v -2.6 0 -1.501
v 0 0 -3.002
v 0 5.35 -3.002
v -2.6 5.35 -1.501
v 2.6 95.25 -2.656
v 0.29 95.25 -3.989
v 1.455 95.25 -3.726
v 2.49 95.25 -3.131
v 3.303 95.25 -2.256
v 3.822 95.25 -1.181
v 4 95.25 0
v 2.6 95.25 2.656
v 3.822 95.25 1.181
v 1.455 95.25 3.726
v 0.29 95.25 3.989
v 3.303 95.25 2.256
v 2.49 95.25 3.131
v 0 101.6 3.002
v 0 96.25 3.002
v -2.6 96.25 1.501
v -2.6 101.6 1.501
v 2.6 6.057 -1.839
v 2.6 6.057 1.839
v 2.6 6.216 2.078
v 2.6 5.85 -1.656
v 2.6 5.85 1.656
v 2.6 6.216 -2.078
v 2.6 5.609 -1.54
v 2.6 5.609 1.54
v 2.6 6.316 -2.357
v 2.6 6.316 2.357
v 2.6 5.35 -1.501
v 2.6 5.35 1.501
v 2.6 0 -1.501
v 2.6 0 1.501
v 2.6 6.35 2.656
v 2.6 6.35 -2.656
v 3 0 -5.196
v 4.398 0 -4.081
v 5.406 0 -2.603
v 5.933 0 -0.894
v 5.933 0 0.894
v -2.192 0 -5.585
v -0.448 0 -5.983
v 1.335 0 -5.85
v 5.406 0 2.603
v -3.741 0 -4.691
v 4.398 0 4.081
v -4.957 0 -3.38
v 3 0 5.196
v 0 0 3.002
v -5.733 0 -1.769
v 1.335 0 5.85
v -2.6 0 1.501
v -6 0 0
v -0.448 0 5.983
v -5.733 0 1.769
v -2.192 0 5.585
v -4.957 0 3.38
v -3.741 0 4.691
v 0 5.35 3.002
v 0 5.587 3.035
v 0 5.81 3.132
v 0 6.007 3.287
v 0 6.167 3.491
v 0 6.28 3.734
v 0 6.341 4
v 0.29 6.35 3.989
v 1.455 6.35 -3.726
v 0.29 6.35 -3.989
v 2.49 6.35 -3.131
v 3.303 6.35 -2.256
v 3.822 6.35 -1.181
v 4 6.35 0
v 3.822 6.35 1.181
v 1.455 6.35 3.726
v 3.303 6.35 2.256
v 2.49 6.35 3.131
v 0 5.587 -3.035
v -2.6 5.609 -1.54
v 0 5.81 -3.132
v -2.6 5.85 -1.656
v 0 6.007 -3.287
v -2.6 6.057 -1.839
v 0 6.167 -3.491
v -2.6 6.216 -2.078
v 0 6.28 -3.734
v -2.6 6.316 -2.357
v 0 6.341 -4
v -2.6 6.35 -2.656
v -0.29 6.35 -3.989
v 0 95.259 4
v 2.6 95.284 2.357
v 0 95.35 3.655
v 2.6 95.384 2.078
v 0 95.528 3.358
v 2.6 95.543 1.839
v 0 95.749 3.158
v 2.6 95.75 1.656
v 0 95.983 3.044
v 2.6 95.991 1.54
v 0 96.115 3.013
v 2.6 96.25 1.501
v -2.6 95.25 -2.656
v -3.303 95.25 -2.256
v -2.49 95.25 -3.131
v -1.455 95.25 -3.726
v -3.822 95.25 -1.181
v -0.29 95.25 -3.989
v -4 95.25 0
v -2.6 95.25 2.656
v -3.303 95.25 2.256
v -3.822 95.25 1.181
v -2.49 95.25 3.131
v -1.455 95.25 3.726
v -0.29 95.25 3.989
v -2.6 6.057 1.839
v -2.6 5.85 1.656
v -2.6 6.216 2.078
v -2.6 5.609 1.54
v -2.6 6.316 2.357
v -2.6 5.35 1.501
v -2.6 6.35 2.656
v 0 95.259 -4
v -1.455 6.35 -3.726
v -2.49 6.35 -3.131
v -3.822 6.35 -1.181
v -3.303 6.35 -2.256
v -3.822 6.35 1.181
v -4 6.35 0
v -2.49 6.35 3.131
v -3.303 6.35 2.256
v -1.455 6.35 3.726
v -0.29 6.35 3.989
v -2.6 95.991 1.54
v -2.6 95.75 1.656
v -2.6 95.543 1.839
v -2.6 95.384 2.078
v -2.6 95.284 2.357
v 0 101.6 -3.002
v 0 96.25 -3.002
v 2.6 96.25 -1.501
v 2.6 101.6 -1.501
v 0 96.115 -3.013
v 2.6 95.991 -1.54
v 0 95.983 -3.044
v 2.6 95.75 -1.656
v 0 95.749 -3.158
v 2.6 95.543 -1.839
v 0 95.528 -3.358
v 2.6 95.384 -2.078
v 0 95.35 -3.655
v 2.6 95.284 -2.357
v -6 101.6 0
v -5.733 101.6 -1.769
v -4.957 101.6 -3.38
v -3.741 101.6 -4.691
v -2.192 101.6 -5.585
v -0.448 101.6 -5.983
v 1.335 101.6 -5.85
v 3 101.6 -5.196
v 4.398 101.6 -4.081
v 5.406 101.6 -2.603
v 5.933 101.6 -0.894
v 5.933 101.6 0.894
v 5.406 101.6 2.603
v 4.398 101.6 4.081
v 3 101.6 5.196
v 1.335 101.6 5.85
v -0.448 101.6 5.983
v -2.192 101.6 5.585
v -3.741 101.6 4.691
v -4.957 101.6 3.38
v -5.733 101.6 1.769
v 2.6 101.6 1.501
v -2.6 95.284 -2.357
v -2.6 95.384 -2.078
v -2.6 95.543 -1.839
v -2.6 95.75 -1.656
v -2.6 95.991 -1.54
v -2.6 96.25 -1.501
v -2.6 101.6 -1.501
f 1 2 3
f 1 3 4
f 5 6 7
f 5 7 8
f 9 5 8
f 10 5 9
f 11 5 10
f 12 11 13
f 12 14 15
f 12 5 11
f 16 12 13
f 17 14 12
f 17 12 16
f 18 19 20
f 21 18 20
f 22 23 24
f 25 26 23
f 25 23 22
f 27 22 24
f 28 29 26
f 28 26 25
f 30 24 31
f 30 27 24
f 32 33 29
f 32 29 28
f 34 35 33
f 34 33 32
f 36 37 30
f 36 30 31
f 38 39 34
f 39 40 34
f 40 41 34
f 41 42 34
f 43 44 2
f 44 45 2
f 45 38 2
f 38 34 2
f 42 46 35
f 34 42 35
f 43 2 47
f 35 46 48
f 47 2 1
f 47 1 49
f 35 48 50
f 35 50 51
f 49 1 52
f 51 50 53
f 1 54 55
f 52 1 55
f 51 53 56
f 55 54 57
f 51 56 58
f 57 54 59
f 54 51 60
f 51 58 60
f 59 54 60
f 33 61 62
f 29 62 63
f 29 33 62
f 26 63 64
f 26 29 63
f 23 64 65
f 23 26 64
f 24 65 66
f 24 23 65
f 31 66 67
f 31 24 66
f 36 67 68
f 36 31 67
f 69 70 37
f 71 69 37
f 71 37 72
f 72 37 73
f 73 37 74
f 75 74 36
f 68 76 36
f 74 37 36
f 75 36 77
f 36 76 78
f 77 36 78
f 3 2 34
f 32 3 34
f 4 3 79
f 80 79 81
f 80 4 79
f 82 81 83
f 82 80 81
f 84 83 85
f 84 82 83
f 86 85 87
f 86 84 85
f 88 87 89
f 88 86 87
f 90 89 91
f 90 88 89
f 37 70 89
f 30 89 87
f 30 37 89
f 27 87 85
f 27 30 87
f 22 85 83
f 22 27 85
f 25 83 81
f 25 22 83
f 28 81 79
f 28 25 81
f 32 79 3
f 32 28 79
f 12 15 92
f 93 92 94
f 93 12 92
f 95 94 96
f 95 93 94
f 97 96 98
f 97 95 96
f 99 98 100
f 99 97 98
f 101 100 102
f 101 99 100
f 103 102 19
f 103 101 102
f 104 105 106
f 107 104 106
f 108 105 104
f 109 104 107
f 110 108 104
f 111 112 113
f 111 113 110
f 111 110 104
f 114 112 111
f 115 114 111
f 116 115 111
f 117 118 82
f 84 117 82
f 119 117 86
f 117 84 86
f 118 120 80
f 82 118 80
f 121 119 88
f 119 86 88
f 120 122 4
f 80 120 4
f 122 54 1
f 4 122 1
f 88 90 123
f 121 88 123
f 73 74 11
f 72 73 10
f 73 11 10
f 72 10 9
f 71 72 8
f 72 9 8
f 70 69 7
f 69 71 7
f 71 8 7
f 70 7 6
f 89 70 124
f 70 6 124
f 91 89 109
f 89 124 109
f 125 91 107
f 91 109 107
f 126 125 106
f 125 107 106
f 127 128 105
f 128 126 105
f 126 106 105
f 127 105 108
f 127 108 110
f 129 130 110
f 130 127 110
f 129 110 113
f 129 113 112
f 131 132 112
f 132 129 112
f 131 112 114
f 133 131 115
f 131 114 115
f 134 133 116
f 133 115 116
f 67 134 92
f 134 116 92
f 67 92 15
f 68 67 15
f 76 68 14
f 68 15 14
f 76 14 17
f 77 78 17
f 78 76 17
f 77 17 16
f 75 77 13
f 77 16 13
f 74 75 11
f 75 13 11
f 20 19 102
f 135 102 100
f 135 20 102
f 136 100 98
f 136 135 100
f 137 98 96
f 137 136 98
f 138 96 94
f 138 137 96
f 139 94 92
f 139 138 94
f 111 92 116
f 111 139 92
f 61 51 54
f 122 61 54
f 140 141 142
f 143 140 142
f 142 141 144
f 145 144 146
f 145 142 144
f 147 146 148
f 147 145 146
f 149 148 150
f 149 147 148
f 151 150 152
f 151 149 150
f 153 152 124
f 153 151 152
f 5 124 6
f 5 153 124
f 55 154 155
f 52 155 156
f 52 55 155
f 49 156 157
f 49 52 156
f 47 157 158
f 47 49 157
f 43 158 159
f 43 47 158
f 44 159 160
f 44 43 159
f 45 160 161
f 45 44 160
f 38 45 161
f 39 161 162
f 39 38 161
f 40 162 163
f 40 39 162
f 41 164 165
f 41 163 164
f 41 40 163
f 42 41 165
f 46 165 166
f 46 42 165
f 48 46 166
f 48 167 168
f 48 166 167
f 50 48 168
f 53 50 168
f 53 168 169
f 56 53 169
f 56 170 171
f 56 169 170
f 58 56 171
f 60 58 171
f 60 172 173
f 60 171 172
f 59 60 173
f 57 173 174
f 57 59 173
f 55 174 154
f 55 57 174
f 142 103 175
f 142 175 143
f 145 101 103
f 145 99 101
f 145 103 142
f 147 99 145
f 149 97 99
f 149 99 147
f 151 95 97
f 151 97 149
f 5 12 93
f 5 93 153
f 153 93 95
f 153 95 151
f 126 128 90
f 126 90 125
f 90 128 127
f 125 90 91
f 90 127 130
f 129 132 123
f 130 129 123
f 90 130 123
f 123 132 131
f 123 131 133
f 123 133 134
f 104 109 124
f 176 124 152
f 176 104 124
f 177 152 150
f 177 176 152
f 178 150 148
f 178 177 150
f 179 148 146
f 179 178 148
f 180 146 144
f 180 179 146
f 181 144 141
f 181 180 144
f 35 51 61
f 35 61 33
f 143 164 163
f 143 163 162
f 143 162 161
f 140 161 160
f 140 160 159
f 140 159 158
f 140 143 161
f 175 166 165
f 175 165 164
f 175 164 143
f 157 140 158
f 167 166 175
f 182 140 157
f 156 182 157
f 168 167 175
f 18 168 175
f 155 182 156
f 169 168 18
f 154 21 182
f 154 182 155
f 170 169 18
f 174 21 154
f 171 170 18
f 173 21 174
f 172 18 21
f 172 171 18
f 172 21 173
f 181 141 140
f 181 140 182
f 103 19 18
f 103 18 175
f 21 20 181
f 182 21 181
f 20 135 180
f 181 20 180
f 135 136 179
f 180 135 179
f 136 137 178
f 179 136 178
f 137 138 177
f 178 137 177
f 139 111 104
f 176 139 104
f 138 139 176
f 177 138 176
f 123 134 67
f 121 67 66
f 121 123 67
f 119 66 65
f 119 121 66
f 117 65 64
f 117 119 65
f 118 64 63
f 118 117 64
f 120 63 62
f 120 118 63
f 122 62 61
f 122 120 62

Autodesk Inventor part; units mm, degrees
ref_plane "YZ Plane" through (0, 0, 0) normal (1, 0, 0) x (0, 1, 0)
sketch "Sketch3" plane through (0, 0, 0) normal (0, 1, 0) x (-1, 0, 0)
  circle A0 centre (0, 0) radius 6
  line L0 (0, 7.3639) -> (0, 0)
  line L1 (0, 0) -> (0, -8.8137)
  line L2 (6.485, 0) -> (0, 0)
  line L3 (-6.963, 0) -> (0, 0)
  line L4 (0, 3.0022) -> (2.6, 1.5011)
  line L5 (0, 3.0022) -> (3.0022, 3.0022) construction
  circle A1 centre (0, 0) radius 6
  line L6 (0, 3.0022) -> (-2.6, 1.5011)
  line L7 (0, -3.0022) -> (2.6, -1.5011)
  line L8 (0, -3.0022) -> (-2.6, -1.5011)
  line L9 (2.6, 1.5011) -> (2.6, -1.5011)
  line L10 (-2.6, 1.5011) -> (-2.6, -1.5011)
  dimension "d6" = 30
  dimension "d7" = 5.2
  dimension "d8" = 3.0022
  dimension "d9" = 3.0022
  dimension "d34" = 12
extrude "Extrusion2" add sketch "Sketch3" along normal blind 101.6 contours L2 L9 L4 L0 A0 | A0 L1 L7 L9 L2 | L0 L6 L10 L3 A0 | A0 L3 L10 L8 L1
ref_plane "Work Plane1" through (0, 50.8, 0) normal (0, -1, 0) x (1, 0, 0)
ref_plane "Work Plane2" through (6, 0, 0) normal (-1, 0, 0) x (0, -1, 0)
sketch "Sketch4" plane through (6, 0, 0) normal (-1, 0, 0) x (0, -1, 0)
  line L0 (-99.6, 6) -> (-99.6, -6) projected
  line L1 (-99.6, 0) -> (0, 0)
  line L2 (0, 3.0022) -> (-101.6, 3.0022) projected
  circle A0 centre (-50.8, 0) radius 3.75
  circle A1 centre (-36.8, 0) radius 3.75
  circle A2 centre (-22.8, 0) radius 3.75
  circle A3 centre (-8.8, 0) radius 3.75
  circle A4 centre (-64.8, 0) radius 3.75
  circle A5 centre (-50.8, 0) radius 3.75
  circle A6 centre (-36.8, 0) radius 3.75
  circle A7 centre (-22.8, 0) radius 3.75
  circle A8 centre (-78.8, 0) radius 3.75
  circle A9 centre (-64.8, 0) radius 3.75
  circle A10 centre (-50.8, 0) radius 3.75
  circle A11 centre (-36.8, 0) radius 3.75
  circle A12 centre (-92.8, 0) radius 3.75
  circle A13 centre (-78.8, 0) radius 3.75
  circle A14 centre (-64.8, 0) radius 3.75
  circle A15 centre (-50.8, 0) radius 3.75
  point P0 (-1, 3.0022)
  point P1 (-100.6, 3.0022)
  dimension "d17" = 7.5
  dimension "d20" = 14
  dimension "d23" = 14
sketch "Sketch5" plane through (0, 50.8, 0) normal (0, -1, 0) x (1, 0, 0)
  circle A0 centre (0, 0) radius 4
  dimension "d35" = 8
extrude "Inner Cut" cut sketch "Sketch5" along normal mid plane 88.9
fillet "Inner hex fillets" radius 1 4 edges at (1.3, 6.35, -2.2517) (1.3, 6.35, 2.2517) (-1.3, 6.35, 2.2517) (-1.3, 6.35, -2.2517)
mirror "Mirror2" about plane through (0, 50.8, 0) normal (0, -1, 0) of "Inner hex fillets"
equation "\"d8\" = d9"
properties part number "Spinner4inx12mm"
